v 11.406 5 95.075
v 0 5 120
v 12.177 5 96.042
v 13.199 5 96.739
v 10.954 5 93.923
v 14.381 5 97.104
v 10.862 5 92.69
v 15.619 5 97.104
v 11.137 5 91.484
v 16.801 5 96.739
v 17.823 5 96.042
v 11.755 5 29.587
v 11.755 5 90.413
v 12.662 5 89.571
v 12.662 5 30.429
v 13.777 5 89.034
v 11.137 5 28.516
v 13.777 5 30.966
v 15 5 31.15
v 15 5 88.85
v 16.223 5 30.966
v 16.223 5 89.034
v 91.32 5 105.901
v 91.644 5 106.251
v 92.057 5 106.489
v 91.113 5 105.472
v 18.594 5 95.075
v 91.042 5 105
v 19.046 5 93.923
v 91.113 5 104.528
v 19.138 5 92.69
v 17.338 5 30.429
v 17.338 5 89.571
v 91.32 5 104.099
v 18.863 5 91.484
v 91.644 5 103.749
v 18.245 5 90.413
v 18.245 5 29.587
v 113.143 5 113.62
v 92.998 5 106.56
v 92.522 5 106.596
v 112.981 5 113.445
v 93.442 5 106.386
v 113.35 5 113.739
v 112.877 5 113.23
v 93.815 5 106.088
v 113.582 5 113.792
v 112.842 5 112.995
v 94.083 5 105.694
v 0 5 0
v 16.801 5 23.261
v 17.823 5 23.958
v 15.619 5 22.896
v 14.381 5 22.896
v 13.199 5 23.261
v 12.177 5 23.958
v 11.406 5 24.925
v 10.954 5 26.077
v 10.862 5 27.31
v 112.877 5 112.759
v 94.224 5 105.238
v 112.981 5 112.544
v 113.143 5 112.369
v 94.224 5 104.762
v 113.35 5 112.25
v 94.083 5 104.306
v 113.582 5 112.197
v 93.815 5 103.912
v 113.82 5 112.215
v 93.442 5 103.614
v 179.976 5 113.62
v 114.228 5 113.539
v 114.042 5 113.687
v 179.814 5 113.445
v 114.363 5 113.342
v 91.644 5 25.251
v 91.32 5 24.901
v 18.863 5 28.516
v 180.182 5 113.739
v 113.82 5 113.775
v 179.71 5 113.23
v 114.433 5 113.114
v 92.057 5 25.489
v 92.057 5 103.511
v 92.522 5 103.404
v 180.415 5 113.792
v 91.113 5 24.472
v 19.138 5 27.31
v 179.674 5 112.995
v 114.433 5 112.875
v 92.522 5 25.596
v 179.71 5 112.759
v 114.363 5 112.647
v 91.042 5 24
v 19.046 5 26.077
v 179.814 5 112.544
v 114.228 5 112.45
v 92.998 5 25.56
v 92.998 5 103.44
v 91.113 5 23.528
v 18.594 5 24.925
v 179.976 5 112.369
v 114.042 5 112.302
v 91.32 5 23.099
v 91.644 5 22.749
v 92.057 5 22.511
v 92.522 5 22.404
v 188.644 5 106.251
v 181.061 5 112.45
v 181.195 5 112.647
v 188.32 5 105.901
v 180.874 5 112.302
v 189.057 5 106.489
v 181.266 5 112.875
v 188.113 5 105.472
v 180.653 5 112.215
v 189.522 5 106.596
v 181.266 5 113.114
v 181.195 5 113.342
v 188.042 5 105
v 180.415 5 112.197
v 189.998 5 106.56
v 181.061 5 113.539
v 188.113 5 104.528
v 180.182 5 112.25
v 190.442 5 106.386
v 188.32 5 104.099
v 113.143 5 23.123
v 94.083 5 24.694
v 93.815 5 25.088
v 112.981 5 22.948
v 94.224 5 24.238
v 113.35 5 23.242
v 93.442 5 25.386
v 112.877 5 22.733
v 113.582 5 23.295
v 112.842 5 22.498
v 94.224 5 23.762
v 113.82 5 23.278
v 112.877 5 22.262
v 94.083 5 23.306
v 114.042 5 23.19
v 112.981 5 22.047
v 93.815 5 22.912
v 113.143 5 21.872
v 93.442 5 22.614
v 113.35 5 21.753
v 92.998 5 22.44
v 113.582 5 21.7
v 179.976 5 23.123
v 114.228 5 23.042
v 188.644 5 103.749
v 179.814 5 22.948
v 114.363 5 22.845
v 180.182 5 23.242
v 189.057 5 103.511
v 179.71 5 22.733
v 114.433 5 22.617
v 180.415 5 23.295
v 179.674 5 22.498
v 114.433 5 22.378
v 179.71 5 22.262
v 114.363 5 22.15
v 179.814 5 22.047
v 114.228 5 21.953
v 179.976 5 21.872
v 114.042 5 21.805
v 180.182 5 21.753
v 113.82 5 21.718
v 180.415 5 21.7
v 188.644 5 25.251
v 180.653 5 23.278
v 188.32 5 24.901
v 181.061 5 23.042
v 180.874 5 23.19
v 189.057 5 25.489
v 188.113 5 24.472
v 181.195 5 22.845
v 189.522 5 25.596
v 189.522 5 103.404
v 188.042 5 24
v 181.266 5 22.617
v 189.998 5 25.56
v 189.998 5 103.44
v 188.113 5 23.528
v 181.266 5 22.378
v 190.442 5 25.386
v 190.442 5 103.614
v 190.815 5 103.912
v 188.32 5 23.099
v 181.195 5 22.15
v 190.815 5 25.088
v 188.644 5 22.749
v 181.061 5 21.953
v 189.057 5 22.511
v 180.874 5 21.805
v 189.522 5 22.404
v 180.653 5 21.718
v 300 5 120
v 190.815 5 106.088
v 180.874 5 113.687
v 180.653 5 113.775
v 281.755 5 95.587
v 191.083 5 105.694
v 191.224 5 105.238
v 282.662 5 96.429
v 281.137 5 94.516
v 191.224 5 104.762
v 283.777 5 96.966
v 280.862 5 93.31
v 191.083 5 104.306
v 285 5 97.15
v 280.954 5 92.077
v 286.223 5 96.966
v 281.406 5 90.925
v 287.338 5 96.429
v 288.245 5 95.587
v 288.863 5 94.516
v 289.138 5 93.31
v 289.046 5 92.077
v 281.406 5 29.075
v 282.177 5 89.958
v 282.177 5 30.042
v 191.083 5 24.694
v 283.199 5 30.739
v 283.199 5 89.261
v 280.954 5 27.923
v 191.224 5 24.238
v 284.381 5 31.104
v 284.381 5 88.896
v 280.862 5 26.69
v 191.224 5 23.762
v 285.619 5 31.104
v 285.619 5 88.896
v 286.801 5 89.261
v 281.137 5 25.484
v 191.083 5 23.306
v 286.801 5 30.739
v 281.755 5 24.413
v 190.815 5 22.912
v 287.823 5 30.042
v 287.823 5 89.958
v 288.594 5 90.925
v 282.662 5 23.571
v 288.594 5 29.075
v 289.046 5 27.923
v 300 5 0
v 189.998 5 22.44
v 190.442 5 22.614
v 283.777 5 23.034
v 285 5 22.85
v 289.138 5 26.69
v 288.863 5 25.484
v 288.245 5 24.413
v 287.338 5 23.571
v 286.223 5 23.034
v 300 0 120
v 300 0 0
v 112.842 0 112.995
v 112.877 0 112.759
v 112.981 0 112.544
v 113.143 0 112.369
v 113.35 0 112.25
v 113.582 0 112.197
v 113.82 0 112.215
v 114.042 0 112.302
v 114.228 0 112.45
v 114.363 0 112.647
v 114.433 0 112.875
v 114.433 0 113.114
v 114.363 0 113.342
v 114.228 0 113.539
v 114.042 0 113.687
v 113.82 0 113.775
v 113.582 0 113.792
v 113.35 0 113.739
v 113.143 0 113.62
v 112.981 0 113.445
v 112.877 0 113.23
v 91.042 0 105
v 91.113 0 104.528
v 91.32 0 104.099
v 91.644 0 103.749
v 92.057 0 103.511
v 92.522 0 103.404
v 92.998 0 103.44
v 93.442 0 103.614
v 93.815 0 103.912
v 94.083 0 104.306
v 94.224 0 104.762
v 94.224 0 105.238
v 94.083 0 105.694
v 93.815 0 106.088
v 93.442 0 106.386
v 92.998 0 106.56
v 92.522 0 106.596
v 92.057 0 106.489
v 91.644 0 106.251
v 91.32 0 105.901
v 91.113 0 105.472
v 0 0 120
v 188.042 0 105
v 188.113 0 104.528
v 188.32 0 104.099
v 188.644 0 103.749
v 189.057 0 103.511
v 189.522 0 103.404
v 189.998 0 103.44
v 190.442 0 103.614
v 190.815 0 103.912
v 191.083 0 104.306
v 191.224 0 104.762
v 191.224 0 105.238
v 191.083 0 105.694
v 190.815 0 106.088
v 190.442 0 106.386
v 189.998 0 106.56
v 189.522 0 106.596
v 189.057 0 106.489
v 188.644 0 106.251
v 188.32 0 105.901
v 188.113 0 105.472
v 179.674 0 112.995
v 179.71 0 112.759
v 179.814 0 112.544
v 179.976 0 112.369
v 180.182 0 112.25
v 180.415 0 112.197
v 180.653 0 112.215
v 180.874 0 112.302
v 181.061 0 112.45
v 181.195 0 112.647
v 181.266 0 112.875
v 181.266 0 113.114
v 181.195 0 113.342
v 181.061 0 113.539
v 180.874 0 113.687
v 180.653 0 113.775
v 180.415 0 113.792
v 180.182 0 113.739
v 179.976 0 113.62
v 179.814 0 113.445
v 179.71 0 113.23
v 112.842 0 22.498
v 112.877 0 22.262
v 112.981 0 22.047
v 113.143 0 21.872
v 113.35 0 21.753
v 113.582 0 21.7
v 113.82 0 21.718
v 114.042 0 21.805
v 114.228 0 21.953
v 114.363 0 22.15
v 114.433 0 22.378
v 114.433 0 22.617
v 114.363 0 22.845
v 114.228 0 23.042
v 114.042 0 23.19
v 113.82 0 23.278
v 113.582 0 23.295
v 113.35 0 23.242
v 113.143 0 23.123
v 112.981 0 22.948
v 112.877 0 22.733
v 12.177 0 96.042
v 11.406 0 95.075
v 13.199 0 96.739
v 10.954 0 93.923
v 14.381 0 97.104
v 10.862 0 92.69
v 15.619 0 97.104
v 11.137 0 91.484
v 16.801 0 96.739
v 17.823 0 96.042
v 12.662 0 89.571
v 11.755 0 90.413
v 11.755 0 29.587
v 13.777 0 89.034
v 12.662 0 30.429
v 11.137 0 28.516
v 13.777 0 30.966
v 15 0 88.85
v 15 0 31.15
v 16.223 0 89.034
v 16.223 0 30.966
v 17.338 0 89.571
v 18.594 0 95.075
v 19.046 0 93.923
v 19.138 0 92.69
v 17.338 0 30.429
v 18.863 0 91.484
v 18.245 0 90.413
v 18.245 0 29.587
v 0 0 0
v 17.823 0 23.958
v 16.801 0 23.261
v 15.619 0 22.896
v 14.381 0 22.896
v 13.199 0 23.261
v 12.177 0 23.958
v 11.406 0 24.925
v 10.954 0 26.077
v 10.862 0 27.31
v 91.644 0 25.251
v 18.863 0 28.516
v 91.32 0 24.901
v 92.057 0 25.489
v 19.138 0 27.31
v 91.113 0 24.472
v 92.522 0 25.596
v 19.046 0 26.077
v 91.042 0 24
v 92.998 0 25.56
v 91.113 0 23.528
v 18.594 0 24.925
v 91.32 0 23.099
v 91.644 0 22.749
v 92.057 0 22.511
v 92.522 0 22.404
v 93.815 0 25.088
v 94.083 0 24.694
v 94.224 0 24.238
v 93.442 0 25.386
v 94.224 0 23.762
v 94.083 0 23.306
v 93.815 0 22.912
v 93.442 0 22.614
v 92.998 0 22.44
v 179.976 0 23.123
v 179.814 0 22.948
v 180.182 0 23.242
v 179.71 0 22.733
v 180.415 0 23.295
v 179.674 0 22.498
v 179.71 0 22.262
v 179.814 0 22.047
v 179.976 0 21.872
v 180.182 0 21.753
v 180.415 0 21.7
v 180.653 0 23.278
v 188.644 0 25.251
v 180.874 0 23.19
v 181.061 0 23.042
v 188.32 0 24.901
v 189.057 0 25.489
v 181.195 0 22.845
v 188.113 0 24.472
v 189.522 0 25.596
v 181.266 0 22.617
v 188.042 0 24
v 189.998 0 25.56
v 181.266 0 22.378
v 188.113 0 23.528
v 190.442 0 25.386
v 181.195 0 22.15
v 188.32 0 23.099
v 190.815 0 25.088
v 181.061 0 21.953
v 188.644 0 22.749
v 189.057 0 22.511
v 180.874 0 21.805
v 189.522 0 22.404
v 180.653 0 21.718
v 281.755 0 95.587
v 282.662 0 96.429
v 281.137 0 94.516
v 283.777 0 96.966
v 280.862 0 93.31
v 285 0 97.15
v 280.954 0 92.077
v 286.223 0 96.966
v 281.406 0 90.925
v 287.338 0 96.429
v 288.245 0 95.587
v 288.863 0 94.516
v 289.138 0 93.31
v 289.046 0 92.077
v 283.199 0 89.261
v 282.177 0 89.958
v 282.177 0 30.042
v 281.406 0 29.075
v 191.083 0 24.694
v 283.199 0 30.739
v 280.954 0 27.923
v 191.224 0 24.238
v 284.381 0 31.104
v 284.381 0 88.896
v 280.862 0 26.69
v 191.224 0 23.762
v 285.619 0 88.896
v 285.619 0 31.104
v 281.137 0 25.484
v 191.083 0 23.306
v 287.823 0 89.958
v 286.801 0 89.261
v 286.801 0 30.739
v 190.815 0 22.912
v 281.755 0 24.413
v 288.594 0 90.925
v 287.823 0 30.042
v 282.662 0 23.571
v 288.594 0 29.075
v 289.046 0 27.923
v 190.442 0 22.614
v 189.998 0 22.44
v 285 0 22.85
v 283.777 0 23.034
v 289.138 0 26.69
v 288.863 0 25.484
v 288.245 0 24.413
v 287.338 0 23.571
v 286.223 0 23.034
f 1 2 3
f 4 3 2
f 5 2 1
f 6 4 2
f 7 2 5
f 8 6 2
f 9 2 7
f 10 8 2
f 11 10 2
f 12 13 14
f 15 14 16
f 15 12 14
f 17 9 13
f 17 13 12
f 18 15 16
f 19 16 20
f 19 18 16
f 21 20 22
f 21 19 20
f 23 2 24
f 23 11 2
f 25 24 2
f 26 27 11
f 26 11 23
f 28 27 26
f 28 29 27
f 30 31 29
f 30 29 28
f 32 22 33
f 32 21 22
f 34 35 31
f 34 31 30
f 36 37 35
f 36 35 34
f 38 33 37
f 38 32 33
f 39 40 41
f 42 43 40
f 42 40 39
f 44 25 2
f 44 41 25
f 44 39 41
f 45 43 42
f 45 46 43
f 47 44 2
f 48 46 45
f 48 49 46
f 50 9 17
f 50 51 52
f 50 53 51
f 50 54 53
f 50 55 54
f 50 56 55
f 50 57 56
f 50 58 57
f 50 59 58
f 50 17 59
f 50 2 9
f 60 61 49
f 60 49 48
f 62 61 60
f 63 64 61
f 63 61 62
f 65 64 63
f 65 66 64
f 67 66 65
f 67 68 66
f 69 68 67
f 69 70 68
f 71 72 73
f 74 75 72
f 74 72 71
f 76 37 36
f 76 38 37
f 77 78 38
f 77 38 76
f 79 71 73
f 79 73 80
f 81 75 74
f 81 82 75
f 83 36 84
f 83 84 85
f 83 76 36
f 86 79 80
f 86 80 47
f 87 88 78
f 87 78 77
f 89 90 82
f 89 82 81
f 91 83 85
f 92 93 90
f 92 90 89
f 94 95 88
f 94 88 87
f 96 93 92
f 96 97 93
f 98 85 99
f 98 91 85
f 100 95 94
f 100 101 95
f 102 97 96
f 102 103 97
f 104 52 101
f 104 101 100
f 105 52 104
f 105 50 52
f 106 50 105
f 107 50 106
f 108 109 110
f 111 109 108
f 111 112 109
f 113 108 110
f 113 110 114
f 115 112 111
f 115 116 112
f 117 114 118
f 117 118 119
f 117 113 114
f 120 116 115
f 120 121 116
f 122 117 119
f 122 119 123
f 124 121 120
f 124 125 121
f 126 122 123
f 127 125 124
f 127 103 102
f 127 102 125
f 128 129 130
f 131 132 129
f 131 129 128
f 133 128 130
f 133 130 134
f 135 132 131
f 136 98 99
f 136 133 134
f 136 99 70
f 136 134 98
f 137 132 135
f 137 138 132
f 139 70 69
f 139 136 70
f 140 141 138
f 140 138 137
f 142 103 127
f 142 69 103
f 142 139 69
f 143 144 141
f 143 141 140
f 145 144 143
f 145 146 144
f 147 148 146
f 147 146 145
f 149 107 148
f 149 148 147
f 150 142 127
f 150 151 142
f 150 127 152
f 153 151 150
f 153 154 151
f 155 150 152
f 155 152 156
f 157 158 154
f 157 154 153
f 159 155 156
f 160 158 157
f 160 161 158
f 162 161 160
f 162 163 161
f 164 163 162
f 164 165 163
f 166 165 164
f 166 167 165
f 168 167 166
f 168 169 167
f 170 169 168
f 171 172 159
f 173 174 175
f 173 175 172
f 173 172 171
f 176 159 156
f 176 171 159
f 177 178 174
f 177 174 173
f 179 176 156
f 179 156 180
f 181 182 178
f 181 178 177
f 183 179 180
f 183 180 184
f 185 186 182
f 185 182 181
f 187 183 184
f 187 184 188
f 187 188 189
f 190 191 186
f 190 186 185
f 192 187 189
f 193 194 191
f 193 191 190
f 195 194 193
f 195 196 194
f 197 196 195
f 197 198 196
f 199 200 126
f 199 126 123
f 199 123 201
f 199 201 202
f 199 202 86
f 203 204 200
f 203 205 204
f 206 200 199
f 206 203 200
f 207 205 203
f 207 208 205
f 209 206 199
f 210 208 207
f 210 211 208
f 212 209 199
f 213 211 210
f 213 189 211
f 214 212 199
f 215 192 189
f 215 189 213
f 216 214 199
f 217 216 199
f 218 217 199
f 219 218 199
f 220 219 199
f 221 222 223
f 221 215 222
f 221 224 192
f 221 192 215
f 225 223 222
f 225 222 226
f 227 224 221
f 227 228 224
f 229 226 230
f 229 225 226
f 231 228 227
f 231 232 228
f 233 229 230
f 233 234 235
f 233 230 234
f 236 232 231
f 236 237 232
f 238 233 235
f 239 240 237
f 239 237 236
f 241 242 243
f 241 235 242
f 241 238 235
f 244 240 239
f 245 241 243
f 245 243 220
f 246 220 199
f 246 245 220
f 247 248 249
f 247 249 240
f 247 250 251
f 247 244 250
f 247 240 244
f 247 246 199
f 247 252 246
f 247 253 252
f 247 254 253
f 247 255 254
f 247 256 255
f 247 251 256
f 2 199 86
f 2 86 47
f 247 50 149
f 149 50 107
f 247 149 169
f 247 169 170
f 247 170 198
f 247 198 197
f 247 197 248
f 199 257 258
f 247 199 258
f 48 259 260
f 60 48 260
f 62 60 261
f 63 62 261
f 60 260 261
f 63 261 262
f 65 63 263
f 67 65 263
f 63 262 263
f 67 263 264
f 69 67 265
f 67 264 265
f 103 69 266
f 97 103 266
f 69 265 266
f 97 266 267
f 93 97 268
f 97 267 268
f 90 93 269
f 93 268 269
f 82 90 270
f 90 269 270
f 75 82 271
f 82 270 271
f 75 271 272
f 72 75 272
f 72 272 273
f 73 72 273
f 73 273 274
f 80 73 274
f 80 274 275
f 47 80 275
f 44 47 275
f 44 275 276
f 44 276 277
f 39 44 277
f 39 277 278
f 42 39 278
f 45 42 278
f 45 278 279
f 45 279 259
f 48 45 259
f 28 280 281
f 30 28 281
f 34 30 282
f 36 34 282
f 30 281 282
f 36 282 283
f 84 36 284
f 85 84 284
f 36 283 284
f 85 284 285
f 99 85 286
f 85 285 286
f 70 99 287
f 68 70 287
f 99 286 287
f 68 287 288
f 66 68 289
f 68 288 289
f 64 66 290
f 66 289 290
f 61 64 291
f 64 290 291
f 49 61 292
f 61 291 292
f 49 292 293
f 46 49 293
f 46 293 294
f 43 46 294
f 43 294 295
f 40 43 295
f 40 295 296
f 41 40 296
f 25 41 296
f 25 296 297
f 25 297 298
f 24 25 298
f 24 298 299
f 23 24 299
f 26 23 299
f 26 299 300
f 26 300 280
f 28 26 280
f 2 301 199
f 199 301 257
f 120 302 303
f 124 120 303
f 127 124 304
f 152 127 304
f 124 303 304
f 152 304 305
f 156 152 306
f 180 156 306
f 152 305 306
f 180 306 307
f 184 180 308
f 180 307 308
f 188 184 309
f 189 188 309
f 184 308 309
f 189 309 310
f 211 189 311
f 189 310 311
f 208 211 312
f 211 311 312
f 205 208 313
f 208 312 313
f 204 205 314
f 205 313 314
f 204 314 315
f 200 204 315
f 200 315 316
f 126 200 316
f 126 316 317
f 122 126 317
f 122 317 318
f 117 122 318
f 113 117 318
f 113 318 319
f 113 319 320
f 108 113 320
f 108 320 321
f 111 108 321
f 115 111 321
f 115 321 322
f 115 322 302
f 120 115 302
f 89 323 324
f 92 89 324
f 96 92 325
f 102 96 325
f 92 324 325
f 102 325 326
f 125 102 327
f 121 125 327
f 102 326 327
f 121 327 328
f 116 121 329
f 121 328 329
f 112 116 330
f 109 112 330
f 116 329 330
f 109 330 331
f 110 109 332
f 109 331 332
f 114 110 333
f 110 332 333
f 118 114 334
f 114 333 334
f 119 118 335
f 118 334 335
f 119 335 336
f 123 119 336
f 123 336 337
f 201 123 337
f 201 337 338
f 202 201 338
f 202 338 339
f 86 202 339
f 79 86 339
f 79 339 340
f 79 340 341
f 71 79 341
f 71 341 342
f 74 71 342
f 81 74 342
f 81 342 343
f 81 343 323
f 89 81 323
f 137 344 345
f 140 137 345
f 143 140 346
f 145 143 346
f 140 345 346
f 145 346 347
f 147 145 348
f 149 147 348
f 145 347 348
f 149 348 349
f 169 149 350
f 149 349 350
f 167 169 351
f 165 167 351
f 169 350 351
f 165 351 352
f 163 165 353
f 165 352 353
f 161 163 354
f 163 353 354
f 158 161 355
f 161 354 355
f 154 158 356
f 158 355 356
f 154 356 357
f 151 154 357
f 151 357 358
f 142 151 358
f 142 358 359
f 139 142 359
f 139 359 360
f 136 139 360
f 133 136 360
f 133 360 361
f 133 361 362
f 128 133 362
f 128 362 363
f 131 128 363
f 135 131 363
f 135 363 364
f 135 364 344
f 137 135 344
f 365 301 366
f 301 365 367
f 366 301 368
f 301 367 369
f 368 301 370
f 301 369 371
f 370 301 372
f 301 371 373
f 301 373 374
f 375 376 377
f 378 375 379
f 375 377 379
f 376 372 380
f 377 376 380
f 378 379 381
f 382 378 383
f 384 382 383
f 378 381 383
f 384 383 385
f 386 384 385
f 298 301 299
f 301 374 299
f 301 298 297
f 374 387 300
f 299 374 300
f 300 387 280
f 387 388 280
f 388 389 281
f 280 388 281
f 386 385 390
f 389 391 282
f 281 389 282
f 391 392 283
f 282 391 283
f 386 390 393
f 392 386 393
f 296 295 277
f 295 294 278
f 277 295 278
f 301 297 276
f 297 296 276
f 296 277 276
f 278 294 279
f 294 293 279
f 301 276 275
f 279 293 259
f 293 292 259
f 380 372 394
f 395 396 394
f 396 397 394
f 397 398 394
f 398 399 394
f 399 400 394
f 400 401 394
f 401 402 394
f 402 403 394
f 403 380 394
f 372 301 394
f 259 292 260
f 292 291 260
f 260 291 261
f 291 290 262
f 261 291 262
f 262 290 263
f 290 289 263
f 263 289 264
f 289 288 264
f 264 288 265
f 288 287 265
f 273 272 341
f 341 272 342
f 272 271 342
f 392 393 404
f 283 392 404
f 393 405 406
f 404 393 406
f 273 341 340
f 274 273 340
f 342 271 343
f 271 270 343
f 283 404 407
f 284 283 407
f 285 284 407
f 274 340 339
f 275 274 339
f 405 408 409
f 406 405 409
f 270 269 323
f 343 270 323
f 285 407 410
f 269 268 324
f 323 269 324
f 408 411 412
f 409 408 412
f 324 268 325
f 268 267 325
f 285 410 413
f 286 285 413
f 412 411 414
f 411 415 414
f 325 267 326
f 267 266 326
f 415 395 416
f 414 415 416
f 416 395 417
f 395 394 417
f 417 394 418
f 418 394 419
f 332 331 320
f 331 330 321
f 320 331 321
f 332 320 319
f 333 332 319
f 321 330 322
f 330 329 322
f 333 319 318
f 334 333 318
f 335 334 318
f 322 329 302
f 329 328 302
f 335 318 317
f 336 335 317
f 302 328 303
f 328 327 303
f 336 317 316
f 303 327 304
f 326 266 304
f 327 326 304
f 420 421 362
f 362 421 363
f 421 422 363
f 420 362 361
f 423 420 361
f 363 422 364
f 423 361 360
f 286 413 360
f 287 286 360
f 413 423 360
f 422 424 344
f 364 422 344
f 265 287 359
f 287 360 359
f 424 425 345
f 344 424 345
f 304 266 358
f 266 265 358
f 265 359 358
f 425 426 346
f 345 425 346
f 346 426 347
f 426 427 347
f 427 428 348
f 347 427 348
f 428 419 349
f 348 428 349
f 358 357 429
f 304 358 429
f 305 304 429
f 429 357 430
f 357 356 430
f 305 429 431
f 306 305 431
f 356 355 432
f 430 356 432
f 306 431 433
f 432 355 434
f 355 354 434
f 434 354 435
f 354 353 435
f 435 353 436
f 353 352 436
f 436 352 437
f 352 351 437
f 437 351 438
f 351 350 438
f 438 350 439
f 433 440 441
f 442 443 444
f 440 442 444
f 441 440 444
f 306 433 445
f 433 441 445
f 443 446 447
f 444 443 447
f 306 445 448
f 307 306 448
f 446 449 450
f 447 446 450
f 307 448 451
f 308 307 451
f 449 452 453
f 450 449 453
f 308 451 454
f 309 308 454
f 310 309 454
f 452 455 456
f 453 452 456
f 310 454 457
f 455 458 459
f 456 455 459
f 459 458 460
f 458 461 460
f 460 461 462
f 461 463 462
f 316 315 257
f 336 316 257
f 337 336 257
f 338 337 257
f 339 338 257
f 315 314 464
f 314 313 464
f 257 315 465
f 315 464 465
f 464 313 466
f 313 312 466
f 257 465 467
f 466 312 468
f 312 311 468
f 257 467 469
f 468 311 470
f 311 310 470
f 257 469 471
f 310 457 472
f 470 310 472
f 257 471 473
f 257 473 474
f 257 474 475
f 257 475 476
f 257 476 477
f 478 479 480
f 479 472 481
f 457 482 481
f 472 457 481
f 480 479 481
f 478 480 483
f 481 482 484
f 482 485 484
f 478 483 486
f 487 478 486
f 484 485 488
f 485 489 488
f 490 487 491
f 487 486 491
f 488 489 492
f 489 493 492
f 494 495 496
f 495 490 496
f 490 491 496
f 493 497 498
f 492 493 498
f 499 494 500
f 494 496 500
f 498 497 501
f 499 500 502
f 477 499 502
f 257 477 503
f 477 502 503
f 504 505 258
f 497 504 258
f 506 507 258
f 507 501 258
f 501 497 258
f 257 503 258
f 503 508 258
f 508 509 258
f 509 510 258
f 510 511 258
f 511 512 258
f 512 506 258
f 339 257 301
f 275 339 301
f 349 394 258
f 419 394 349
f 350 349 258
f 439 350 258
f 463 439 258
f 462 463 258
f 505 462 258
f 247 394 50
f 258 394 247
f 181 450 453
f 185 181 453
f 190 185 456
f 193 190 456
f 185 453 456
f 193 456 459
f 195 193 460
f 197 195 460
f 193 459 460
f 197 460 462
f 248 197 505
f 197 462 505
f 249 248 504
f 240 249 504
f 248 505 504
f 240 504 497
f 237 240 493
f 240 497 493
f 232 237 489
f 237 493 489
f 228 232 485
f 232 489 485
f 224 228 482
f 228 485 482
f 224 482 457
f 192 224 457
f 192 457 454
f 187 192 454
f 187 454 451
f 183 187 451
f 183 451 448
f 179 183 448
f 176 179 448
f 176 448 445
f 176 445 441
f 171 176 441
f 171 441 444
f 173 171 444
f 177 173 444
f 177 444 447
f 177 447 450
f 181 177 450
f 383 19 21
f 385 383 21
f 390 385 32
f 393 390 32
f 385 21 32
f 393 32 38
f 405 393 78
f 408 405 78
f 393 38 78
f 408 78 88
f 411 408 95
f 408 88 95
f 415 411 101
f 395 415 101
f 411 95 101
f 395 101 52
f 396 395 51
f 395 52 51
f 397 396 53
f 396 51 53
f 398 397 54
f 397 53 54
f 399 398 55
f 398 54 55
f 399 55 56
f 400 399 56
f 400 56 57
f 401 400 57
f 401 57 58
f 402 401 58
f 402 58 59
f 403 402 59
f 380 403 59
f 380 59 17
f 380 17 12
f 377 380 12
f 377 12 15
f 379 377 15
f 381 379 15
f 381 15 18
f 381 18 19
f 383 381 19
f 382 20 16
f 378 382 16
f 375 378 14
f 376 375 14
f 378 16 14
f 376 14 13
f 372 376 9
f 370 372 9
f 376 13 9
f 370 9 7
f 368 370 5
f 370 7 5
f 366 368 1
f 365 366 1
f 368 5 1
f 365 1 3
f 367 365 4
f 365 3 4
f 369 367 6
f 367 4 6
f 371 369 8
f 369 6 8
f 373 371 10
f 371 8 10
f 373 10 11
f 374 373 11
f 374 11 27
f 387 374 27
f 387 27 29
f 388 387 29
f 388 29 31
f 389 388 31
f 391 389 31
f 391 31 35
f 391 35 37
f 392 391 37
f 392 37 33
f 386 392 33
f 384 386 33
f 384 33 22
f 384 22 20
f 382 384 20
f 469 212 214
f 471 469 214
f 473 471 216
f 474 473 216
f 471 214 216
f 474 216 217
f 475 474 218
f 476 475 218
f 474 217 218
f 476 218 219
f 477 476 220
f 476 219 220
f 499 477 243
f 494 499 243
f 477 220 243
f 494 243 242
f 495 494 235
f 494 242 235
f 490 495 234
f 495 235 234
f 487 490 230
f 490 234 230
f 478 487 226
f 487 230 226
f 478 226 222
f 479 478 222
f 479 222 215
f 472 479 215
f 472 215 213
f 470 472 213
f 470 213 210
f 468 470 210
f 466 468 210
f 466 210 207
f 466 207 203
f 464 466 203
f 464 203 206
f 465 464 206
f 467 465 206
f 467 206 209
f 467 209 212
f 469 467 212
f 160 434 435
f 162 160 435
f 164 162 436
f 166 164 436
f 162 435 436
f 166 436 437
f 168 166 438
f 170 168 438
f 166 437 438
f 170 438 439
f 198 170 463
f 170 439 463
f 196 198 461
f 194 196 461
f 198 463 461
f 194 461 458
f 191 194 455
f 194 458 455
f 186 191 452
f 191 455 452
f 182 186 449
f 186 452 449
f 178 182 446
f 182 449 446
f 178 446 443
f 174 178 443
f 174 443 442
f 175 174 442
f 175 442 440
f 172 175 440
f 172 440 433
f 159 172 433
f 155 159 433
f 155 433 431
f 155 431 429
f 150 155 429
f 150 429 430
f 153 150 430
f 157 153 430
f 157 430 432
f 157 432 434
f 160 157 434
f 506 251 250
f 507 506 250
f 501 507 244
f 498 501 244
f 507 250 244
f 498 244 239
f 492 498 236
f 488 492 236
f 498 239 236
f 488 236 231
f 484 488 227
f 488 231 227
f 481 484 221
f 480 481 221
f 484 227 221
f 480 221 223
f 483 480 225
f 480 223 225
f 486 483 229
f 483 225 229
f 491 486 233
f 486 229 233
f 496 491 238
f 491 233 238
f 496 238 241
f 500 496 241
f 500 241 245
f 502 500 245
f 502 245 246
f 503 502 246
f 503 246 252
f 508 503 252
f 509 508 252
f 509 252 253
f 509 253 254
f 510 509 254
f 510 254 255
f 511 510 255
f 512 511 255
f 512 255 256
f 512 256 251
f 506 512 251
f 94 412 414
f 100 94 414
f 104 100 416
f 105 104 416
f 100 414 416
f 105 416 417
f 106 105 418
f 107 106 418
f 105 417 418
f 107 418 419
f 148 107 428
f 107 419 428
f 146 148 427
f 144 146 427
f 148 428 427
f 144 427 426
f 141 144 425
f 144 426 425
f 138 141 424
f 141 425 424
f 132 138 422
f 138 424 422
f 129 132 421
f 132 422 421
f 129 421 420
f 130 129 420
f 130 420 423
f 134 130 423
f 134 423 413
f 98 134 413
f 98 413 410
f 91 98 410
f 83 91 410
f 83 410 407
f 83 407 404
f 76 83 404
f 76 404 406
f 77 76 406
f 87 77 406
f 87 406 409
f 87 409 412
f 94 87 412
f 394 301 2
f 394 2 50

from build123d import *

# Parameters (mm, degrees)
SKETCH1_W               = 300
SKETCH1_H               = 120
BOSS_EXTRUDE1_DEPTH     = 5
TAP_DRILL_FOR_M2_TAP1_D = 1.6
M3_CLEARANCE_HOLE1_D    = 3.2
SKETCH2_R               = 4.15
CUT_EXTRUDE1_DEPTH      = 324.148572641


with BuildPart() as part:
    # Sketch1 → Boss-Extrude1 (new body)
    with BuildSketch(Plane(origin=(0, 0, 0), x_dir=(1, 0, 0), z_dir=(0, 1, 0))):
        with Locations((150, -60)):
            Rectangle(SKETCH1_W, SKETCH1_H)
    extrude(amount=BOSS_EXTRUDE1_DEPTH)

    # Tap Drill for M2 Tap1 (through all)
    with Locations(Plane(origin=(0, 5, 0), x_dir=(1, 0, 0), z_dir=(0, 1, 0))):
        with Locations((113.641894276, -112.9946), (180.474494276, -112.9946), (180.474494276, -22.4976), (113.641894276, -22.4976)):
            Hole(TAP_DRILL_FOR_M2_TAP1_D / 2)

    # M3 Clearance Hole1 (through all)
    with Locations(Plane(origin=(0, 5, 0), x_dir=(1, 0, 0), z_dir=(0, 1, 0))):
        with Locations((92.641894276, -105), (92.641894276, -24), (189.641894276, -24), (189.641894276, -105)):
            Hole(M3_CLEARANCE_HOLE1_D / 2)

    # Sketch2 → Cut-Extrude1 (cut, through all)
    with BuildSketch(Plane(origin=(0, 5, 0), x_dir=(1, 0, 0), z_dir=(0, 1, 0))):
        with Locations(Location((15, -27, 0), (0, 0, 270))):
            Circle(SKETCH2_R)
        with Locations(Location((285, -27, 0), (0, 0, 90))):
            Circle(SKETCH2_R)
        with Locations(Location((285, -93, 0), (0, 0, 270))):
            Circle(SKETCH2_R)
        with Locations(Location((15, -93, 0), (0, 0, 90))):
            Circle(SKETCH2_R)
    extrude(amount=-CUT_EXTRUDE1_DEPTH, mode=Mode.SUBTRACT)


solid = part.part
